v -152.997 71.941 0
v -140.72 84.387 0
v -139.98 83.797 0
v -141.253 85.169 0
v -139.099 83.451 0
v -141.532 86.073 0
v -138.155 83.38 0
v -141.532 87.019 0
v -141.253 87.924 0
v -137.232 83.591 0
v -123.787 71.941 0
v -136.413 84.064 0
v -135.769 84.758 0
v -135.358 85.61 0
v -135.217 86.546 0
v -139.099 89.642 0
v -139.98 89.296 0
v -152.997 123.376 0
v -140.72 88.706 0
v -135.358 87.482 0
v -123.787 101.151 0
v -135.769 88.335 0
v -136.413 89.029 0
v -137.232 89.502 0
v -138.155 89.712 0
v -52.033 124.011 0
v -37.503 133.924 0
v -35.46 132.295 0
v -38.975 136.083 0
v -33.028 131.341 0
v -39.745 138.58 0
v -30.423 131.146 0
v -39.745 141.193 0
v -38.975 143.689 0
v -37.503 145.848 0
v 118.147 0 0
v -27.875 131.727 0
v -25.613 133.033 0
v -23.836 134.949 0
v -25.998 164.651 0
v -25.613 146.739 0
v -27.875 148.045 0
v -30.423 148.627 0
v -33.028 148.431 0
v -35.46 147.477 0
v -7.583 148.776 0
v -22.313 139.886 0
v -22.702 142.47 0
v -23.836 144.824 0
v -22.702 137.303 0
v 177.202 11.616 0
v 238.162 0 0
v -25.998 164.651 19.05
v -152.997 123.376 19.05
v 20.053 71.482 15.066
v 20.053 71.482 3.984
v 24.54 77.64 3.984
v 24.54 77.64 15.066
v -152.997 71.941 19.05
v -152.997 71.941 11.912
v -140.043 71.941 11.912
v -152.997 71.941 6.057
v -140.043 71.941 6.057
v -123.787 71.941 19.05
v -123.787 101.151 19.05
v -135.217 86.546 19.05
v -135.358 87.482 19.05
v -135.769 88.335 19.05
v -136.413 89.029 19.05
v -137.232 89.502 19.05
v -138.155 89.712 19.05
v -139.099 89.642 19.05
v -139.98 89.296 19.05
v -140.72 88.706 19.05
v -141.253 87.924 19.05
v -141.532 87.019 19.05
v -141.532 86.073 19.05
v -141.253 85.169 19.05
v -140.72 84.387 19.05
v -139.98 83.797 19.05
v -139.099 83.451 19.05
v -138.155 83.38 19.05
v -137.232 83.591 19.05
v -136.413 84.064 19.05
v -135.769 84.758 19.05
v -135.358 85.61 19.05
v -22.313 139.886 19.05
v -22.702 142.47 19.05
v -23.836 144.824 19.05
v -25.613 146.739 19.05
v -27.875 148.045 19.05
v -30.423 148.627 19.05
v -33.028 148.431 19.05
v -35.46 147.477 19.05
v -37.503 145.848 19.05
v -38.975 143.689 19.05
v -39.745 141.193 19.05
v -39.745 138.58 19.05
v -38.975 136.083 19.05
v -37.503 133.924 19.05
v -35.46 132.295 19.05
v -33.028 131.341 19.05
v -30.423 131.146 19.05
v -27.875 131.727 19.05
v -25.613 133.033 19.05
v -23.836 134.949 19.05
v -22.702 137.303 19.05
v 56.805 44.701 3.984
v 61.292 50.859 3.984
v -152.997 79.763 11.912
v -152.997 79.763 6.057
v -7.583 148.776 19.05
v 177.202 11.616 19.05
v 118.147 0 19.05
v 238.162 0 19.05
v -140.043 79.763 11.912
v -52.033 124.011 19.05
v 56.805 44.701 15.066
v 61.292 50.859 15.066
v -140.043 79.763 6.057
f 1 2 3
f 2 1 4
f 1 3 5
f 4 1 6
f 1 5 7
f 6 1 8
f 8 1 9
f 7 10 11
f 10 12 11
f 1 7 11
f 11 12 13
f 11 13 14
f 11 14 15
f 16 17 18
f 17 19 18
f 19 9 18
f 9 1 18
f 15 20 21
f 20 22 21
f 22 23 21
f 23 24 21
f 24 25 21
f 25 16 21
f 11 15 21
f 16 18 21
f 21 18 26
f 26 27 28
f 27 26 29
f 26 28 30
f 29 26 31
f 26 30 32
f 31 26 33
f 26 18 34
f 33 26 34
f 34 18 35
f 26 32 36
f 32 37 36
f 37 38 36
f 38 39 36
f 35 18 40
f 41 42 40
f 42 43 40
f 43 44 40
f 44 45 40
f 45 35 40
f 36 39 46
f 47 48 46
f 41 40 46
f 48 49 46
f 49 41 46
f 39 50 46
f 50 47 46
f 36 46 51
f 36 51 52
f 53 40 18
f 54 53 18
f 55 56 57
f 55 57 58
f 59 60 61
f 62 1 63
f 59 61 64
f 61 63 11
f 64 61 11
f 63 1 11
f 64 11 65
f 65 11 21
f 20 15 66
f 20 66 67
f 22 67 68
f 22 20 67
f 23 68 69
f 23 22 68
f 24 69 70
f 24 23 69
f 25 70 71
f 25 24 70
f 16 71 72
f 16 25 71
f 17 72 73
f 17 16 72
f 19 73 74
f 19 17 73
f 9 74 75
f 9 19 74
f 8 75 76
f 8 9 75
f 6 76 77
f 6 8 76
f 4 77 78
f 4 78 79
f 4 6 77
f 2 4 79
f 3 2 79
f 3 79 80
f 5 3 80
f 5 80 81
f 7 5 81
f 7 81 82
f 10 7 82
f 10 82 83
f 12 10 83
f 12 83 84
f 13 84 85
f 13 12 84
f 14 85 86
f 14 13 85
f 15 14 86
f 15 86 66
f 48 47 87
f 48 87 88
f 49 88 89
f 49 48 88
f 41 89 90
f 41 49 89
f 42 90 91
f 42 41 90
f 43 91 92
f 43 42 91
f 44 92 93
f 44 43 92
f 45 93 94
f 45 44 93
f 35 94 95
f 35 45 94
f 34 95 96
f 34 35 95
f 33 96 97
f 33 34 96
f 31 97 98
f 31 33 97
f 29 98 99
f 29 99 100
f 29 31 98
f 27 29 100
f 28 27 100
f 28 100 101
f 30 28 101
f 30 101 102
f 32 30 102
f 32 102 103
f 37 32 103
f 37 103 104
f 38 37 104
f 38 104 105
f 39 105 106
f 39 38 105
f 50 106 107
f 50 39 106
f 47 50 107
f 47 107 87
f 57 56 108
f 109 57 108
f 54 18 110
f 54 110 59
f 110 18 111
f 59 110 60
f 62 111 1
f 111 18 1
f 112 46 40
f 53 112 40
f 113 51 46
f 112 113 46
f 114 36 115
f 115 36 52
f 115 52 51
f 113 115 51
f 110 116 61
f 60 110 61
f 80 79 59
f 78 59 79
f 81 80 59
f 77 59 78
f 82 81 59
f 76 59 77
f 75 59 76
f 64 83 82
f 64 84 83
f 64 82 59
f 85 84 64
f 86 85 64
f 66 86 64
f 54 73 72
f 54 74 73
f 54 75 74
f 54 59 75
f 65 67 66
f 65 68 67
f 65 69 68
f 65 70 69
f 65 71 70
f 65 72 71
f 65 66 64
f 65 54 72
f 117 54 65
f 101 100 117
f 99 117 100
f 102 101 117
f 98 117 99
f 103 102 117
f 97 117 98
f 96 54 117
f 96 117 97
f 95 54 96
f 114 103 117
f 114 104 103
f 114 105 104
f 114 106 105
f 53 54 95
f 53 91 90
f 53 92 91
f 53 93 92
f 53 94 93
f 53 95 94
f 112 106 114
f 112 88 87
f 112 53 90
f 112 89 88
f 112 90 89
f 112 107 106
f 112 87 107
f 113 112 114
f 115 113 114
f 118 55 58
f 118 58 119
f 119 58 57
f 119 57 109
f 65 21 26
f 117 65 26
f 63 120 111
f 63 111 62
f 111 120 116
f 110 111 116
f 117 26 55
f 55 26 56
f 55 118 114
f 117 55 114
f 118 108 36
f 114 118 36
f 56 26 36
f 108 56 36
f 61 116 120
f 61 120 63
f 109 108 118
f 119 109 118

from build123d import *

# Parameters (mm, degrees)
F0_R     = 3.175
F0_R_2   = 8.7650051074
F1_DEPTH = 19.05
F2_W     = 45.4748366028
F2_H     = 11.0821020789
F3_DEPTH = 7.62
F4_W     = 7.8214257956
F4_H     = 5.8546541259
F5_DEPTH = 12.954


with BuildPart() as f1:
    # F0 (on Top) → F1 (new body)
    with BuildSketch(Plane.XY):
        Polygon((177.2020328314, 11.616397533), (-7.5826541561, 148.7761547738), (-25.9976245138, 164.651133018), (-152.9974015162, 123.3761982856), (-152.9974015162, 71.9412896602), (-123.787456631, 71.9412896602), (-123.787456631, 101.1512417973), (-52.0325784639, 124.0111939344), (118.1471256564, 0), (238.161905197, 0), align=None)
        with Locations((-138.3924290736, 86.5462621028)):
            Circle(F0_R, mode=Mode.SUBTRACT)
        with Locations((-31.0776132732, 139.8861721785)):
            Circle(F0_R_2, mode=Mode.SUBTRACT)
    extrude(amount=F1_DEPTH)

    # F2 (on face) → F3 (cut)
    with BuildSketch(Plane(origin=(40.9779427168, 56.2337475009, 0), x_dir=(0.8081842281, -0.5889297526, 0), z_dir=(-0.5889297526, -0.8081842281, 0))):
        with Locations((-3.1541539356, 9.5249998849)):
            Rectangle(F2_W, F2_H)
    extrude(amount=-F3_DEPTH, mode=Mode.SUBTRACT)

    # F4 (on face) → F5 (cut)
    with BuildSketch(Plane(origin=(-152.9974015162, 0, 0), x_dir=(0, -1, 0), z_dir=(-1, 0, 0))):
        with Locations((-75.852002558, 8.9845708571)):
            Rectangle(F4_W, F4_H)
    extrude(amount=-F5_DEPTH, mode=Mode.SUBTRACT)


solid = f1.part
